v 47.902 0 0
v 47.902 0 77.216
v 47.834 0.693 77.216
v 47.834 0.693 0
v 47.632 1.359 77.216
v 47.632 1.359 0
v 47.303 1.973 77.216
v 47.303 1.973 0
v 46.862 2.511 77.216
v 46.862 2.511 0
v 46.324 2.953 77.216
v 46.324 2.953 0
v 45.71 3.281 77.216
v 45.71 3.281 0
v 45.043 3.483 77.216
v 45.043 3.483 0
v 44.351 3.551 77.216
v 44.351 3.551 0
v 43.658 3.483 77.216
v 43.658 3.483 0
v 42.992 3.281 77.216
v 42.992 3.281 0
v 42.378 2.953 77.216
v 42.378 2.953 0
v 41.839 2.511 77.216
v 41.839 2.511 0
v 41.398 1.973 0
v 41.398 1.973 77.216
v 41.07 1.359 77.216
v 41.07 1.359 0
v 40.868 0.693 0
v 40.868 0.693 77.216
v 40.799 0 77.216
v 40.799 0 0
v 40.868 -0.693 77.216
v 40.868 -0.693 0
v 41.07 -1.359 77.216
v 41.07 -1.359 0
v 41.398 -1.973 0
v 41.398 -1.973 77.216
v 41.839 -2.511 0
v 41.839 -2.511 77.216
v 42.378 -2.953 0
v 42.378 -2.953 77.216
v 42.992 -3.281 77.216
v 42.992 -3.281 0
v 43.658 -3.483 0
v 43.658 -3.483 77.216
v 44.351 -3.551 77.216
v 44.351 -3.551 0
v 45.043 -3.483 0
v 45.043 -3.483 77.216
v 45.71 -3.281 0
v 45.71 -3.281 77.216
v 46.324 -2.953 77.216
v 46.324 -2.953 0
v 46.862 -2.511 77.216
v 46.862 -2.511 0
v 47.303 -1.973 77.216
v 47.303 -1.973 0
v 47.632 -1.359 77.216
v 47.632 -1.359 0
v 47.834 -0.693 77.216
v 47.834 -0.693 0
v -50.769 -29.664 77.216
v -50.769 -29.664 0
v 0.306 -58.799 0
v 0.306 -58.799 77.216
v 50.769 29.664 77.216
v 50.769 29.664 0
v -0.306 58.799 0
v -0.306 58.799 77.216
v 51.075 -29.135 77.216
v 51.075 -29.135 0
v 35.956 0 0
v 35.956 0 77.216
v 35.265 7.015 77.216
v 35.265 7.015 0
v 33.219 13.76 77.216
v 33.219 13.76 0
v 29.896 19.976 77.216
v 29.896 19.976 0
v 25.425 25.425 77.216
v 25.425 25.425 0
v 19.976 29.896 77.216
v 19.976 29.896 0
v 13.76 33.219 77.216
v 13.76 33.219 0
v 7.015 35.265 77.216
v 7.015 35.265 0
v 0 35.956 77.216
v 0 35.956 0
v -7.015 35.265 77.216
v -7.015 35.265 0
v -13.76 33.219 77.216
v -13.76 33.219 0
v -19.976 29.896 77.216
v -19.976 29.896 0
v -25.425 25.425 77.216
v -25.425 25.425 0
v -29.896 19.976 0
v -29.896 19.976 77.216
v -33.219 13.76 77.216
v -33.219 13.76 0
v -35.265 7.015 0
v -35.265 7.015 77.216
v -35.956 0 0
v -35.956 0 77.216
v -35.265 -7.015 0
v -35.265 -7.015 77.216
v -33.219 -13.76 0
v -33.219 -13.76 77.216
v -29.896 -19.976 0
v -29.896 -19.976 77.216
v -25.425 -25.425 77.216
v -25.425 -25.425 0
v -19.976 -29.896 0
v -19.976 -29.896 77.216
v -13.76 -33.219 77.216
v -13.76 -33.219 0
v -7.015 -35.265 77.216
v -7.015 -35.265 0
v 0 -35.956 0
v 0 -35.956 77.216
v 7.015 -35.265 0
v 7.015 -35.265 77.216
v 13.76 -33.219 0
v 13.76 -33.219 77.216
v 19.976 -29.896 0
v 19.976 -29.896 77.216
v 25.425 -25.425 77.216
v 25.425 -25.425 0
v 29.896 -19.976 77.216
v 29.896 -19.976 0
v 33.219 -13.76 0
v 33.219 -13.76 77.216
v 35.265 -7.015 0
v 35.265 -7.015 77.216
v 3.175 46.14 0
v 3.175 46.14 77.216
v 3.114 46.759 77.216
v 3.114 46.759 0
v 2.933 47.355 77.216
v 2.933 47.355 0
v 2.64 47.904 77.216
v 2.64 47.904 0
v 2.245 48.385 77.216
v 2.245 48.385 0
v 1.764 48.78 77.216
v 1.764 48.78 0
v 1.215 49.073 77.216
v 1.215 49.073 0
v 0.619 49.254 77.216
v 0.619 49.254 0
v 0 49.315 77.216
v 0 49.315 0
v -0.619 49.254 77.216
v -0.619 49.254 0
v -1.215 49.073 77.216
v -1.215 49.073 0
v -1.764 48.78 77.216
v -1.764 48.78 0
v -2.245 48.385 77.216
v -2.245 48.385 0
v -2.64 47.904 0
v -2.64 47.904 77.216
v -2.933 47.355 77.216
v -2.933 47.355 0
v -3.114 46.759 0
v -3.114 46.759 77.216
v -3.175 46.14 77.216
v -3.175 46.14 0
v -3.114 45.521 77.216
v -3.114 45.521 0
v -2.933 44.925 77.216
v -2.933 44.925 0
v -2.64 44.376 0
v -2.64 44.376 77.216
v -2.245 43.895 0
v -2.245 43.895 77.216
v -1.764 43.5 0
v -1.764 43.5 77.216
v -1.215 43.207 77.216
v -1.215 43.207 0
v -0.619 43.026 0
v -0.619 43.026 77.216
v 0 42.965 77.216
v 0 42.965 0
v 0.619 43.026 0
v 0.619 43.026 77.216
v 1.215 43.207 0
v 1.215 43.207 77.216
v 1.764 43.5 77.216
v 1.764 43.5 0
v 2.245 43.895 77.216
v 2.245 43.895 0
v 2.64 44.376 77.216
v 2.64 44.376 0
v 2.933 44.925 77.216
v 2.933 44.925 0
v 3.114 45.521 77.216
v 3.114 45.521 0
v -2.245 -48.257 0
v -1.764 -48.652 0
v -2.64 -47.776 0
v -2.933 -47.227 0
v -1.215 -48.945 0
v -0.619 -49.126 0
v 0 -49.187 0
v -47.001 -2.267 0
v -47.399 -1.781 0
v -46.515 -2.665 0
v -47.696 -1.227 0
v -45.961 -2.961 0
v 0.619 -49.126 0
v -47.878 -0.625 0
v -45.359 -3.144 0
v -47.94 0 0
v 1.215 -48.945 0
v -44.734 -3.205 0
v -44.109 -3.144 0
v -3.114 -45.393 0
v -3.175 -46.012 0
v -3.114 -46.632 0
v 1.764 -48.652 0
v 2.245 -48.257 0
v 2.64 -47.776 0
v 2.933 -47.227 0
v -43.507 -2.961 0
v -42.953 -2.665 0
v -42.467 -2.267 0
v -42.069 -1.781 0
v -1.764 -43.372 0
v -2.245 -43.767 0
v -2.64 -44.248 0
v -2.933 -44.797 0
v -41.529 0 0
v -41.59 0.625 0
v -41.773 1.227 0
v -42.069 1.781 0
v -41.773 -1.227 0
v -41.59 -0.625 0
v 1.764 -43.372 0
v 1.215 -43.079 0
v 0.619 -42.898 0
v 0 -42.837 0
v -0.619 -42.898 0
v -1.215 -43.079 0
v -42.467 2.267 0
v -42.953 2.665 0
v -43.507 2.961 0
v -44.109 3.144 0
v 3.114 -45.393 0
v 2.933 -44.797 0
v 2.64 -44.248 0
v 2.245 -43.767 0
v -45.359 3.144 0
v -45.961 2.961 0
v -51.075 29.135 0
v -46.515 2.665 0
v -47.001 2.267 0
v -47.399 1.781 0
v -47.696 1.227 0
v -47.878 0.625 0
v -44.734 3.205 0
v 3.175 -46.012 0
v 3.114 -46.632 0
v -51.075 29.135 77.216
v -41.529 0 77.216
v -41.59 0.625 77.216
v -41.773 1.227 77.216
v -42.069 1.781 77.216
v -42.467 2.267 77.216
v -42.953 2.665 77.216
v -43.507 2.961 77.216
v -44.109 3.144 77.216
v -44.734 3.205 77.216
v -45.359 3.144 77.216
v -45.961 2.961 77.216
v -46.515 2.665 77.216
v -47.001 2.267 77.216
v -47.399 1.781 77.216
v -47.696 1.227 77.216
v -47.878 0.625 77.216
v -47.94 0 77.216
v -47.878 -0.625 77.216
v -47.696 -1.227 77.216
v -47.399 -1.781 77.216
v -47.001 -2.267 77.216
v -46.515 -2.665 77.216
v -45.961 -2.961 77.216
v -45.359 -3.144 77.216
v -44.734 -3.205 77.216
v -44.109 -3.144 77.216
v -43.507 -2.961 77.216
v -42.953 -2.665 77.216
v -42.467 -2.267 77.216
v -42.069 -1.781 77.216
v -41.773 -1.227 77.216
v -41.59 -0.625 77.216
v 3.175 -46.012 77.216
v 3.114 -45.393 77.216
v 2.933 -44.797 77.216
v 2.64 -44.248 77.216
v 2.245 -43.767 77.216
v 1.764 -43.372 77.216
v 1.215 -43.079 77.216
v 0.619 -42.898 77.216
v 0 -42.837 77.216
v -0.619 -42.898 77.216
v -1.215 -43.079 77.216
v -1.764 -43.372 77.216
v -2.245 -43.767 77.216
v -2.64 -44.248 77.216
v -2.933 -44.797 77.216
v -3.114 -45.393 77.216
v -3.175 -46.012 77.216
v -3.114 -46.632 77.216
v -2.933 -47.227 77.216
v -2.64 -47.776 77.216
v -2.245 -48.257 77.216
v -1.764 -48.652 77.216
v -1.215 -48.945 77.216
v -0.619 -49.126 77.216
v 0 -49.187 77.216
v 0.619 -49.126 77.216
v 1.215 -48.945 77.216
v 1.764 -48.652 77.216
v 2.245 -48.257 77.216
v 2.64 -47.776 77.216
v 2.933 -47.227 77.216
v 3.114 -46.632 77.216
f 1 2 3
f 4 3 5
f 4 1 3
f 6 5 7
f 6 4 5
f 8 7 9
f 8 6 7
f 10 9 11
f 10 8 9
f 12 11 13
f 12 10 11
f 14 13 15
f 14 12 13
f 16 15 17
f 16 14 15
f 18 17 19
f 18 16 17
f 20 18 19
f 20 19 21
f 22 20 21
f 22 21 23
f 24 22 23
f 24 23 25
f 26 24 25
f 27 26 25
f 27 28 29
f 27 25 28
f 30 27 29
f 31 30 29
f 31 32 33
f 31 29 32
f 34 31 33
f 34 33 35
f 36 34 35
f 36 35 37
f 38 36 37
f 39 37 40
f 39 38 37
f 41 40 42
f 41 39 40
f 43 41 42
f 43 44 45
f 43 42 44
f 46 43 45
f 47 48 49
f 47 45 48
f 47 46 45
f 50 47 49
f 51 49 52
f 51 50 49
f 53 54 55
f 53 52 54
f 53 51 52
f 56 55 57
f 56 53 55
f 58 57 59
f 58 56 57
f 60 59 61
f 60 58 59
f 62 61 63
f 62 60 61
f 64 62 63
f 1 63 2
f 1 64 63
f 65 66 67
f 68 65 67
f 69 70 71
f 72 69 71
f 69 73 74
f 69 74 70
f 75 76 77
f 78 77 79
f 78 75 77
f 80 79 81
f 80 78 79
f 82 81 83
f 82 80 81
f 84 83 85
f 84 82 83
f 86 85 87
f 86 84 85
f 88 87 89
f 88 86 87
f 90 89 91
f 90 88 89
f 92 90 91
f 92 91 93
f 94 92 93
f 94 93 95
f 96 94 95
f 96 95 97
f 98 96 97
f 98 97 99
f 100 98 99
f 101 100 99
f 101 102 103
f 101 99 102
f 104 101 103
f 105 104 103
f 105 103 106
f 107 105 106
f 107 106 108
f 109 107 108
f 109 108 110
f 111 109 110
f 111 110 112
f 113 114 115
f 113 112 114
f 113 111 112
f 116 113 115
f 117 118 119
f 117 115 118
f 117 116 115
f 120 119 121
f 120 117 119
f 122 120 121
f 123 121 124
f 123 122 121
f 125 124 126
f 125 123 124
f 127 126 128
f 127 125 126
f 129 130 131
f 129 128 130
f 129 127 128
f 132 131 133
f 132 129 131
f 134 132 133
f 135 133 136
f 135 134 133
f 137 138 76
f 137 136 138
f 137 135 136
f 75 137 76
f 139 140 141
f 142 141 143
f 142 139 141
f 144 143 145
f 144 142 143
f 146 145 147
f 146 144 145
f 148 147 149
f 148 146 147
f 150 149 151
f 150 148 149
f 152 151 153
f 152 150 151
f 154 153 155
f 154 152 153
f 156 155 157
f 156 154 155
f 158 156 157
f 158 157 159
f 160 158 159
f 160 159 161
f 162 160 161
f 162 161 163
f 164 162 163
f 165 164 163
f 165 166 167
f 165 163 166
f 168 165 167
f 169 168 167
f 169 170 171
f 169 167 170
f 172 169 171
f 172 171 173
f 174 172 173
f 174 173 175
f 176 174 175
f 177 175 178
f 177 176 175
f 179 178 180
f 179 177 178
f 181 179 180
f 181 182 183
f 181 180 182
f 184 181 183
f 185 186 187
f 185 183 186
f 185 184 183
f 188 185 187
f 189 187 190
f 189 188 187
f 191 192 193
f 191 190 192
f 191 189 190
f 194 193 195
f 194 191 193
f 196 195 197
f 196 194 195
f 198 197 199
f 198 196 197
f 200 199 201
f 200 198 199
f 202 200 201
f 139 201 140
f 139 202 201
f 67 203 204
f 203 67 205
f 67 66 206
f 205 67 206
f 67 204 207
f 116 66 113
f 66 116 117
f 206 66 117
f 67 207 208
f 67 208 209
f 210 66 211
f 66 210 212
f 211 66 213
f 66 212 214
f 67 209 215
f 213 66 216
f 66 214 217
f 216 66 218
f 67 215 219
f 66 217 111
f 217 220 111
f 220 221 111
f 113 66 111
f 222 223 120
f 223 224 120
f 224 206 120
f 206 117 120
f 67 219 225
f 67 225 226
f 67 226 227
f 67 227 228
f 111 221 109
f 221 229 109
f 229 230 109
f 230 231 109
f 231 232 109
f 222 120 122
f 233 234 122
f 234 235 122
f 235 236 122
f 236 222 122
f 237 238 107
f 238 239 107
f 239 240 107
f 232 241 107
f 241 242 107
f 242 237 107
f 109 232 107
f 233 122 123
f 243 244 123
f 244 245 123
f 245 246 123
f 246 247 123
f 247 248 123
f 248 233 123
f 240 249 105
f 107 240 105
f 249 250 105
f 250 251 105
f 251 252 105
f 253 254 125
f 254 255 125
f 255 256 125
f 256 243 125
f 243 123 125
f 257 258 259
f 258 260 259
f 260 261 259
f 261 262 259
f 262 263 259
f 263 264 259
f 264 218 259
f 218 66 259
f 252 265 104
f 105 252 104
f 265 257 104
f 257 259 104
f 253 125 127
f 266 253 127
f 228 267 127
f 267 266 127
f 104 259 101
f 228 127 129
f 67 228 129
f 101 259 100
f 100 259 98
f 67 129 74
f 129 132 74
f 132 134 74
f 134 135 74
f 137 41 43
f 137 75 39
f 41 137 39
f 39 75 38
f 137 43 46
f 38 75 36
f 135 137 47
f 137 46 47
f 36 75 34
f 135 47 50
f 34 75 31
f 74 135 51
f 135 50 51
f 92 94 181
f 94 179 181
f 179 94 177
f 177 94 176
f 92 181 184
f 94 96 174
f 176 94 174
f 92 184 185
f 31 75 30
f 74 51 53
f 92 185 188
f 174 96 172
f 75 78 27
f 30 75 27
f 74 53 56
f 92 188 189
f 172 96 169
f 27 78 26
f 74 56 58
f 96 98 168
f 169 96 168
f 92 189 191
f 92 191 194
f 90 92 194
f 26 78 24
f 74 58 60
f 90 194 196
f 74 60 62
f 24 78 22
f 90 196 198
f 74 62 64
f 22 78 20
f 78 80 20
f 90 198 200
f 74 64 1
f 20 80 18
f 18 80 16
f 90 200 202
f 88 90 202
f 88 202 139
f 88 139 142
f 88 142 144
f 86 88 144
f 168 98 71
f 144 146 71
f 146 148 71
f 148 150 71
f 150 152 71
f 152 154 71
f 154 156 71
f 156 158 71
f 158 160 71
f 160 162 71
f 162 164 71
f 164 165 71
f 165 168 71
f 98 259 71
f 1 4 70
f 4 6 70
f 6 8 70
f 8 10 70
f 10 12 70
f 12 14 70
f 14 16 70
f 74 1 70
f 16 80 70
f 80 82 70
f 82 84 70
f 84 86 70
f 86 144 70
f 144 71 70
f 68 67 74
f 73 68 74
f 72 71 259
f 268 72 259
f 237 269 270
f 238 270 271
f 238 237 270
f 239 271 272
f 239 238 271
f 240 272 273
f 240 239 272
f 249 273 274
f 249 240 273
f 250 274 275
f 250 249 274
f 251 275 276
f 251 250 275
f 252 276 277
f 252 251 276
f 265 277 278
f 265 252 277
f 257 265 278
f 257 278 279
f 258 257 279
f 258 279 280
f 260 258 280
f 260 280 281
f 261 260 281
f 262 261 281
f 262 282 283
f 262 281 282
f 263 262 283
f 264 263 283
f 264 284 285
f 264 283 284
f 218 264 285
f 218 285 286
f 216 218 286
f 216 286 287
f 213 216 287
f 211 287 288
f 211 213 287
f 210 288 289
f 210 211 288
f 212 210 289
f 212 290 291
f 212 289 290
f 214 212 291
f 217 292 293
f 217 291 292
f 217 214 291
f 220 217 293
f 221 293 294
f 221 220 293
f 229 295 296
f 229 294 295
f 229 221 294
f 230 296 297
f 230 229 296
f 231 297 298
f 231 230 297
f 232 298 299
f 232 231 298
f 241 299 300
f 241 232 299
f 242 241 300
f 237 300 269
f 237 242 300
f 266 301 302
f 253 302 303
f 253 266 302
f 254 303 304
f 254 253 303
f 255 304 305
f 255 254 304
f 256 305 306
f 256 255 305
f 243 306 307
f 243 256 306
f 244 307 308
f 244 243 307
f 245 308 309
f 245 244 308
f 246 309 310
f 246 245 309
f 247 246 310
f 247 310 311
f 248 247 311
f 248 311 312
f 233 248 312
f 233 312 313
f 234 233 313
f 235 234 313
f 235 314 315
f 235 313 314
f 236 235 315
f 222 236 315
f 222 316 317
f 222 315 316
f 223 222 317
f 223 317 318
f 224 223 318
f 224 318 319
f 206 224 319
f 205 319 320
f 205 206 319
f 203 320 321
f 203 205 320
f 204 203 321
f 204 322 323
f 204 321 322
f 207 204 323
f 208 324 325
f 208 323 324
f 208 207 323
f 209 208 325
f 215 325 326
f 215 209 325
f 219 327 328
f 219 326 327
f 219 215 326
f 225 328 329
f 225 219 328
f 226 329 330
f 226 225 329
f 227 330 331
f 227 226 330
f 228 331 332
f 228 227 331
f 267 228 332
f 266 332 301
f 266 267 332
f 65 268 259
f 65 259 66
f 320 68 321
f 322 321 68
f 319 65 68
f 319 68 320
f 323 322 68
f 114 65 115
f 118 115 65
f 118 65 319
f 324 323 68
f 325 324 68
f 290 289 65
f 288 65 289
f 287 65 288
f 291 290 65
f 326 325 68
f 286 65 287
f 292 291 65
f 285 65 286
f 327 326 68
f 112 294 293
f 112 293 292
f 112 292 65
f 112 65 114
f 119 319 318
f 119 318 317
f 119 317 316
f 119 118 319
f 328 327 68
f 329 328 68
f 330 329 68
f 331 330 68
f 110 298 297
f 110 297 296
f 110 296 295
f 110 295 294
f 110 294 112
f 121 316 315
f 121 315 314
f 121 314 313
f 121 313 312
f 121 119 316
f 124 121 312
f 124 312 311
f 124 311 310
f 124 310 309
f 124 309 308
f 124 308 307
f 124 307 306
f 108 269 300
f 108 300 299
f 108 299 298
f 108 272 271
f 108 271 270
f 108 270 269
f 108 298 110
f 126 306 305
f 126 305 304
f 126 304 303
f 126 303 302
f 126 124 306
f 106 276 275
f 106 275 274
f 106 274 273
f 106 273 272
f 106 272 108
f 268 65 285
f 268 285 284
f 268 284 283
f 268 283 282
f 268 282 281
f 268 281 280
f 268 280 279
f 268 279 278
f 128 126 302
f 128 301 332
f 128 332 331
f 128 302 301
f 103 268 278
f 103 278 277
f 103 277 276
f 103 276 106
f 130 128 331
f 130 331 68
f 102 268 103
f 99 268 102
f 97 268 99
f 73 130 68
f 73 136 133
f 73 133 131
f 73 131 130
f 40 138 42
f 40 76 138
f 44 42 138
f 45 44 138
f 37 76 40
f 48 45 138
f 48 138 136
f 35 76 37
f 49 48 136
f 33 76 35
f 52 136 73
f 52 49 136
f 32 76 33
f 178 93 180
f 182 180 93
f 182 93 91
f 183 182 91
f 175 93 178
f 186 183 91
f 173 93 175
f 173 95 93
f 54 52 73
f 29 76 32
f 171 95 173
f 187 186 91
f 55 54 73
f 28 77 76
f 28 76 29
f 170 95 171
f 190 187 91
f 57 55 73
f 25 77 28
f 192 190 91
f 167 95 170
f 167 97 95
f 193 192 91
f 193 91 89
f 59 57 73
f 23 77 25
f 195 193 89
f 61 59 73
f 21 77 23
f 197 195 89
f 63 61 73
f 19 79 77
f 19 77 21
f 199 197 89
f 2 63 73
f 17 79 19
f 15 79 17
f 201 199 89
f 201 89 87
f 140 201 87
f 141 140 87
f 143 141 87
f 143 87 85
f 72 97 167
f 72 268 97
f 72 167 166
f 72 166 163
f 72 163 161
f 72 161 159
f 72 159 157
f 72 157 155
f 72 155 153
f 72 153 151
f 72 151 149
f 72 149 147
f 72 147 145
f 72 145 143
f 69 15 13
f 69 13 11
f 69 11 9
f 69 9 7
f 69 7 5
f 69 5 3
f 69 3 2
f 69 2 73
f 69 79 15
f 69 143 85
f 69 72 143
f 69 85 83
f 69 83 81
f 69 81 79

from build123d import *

# Parameters (mm, degrees)
F1_DEPTH = 77.216
F2_R     = 35.955946
F3_DEPTH = 87.884
F4_R     = 3.205496
F4_R_2   = 3.551228
F4_R_3   = 3.174776
F4_R_4   = 3.174773
F5_DEPTH = 95.504


with BuildPart() as f1:
    # F0 (on Top) → F1 (new body)
    with BuildSketch(Plane.XY):
        Polygon((0.305662, -58.799351), (51.074563, -29.134964), (50.768901, 29.664386), (-0.305662, 58.799351), (-51.074563, 29.134964), (-50.768901, -29.664386), align=None)
    extrude(amount=F1_DEPTH)

    # F2 (on Top) → F3 (cut)
    with BuildSketch(Plane.XY):
        Circle(F2_R)
    extrude(amount=F3_DEPTH, mode=Mode.SUBTRACT)

    # F4 (on Top) → F5 (cut)
    with BuildSketch(Plane.XY):
        with Locations((-44.734024, 0)):
            Circle(F4_R)
        with Locations((44.350594, 0)):
            Circle(F4_R_2)
        with Locations((0, 46.139952)):
            Circle(F4_R_3)
        with Locations((0, -46.012141)):
            Circle(F4_R_4)
    extrude(amount=F5_DEPTH, mode=Mode.SUBTRACT)


solid = f1.part
